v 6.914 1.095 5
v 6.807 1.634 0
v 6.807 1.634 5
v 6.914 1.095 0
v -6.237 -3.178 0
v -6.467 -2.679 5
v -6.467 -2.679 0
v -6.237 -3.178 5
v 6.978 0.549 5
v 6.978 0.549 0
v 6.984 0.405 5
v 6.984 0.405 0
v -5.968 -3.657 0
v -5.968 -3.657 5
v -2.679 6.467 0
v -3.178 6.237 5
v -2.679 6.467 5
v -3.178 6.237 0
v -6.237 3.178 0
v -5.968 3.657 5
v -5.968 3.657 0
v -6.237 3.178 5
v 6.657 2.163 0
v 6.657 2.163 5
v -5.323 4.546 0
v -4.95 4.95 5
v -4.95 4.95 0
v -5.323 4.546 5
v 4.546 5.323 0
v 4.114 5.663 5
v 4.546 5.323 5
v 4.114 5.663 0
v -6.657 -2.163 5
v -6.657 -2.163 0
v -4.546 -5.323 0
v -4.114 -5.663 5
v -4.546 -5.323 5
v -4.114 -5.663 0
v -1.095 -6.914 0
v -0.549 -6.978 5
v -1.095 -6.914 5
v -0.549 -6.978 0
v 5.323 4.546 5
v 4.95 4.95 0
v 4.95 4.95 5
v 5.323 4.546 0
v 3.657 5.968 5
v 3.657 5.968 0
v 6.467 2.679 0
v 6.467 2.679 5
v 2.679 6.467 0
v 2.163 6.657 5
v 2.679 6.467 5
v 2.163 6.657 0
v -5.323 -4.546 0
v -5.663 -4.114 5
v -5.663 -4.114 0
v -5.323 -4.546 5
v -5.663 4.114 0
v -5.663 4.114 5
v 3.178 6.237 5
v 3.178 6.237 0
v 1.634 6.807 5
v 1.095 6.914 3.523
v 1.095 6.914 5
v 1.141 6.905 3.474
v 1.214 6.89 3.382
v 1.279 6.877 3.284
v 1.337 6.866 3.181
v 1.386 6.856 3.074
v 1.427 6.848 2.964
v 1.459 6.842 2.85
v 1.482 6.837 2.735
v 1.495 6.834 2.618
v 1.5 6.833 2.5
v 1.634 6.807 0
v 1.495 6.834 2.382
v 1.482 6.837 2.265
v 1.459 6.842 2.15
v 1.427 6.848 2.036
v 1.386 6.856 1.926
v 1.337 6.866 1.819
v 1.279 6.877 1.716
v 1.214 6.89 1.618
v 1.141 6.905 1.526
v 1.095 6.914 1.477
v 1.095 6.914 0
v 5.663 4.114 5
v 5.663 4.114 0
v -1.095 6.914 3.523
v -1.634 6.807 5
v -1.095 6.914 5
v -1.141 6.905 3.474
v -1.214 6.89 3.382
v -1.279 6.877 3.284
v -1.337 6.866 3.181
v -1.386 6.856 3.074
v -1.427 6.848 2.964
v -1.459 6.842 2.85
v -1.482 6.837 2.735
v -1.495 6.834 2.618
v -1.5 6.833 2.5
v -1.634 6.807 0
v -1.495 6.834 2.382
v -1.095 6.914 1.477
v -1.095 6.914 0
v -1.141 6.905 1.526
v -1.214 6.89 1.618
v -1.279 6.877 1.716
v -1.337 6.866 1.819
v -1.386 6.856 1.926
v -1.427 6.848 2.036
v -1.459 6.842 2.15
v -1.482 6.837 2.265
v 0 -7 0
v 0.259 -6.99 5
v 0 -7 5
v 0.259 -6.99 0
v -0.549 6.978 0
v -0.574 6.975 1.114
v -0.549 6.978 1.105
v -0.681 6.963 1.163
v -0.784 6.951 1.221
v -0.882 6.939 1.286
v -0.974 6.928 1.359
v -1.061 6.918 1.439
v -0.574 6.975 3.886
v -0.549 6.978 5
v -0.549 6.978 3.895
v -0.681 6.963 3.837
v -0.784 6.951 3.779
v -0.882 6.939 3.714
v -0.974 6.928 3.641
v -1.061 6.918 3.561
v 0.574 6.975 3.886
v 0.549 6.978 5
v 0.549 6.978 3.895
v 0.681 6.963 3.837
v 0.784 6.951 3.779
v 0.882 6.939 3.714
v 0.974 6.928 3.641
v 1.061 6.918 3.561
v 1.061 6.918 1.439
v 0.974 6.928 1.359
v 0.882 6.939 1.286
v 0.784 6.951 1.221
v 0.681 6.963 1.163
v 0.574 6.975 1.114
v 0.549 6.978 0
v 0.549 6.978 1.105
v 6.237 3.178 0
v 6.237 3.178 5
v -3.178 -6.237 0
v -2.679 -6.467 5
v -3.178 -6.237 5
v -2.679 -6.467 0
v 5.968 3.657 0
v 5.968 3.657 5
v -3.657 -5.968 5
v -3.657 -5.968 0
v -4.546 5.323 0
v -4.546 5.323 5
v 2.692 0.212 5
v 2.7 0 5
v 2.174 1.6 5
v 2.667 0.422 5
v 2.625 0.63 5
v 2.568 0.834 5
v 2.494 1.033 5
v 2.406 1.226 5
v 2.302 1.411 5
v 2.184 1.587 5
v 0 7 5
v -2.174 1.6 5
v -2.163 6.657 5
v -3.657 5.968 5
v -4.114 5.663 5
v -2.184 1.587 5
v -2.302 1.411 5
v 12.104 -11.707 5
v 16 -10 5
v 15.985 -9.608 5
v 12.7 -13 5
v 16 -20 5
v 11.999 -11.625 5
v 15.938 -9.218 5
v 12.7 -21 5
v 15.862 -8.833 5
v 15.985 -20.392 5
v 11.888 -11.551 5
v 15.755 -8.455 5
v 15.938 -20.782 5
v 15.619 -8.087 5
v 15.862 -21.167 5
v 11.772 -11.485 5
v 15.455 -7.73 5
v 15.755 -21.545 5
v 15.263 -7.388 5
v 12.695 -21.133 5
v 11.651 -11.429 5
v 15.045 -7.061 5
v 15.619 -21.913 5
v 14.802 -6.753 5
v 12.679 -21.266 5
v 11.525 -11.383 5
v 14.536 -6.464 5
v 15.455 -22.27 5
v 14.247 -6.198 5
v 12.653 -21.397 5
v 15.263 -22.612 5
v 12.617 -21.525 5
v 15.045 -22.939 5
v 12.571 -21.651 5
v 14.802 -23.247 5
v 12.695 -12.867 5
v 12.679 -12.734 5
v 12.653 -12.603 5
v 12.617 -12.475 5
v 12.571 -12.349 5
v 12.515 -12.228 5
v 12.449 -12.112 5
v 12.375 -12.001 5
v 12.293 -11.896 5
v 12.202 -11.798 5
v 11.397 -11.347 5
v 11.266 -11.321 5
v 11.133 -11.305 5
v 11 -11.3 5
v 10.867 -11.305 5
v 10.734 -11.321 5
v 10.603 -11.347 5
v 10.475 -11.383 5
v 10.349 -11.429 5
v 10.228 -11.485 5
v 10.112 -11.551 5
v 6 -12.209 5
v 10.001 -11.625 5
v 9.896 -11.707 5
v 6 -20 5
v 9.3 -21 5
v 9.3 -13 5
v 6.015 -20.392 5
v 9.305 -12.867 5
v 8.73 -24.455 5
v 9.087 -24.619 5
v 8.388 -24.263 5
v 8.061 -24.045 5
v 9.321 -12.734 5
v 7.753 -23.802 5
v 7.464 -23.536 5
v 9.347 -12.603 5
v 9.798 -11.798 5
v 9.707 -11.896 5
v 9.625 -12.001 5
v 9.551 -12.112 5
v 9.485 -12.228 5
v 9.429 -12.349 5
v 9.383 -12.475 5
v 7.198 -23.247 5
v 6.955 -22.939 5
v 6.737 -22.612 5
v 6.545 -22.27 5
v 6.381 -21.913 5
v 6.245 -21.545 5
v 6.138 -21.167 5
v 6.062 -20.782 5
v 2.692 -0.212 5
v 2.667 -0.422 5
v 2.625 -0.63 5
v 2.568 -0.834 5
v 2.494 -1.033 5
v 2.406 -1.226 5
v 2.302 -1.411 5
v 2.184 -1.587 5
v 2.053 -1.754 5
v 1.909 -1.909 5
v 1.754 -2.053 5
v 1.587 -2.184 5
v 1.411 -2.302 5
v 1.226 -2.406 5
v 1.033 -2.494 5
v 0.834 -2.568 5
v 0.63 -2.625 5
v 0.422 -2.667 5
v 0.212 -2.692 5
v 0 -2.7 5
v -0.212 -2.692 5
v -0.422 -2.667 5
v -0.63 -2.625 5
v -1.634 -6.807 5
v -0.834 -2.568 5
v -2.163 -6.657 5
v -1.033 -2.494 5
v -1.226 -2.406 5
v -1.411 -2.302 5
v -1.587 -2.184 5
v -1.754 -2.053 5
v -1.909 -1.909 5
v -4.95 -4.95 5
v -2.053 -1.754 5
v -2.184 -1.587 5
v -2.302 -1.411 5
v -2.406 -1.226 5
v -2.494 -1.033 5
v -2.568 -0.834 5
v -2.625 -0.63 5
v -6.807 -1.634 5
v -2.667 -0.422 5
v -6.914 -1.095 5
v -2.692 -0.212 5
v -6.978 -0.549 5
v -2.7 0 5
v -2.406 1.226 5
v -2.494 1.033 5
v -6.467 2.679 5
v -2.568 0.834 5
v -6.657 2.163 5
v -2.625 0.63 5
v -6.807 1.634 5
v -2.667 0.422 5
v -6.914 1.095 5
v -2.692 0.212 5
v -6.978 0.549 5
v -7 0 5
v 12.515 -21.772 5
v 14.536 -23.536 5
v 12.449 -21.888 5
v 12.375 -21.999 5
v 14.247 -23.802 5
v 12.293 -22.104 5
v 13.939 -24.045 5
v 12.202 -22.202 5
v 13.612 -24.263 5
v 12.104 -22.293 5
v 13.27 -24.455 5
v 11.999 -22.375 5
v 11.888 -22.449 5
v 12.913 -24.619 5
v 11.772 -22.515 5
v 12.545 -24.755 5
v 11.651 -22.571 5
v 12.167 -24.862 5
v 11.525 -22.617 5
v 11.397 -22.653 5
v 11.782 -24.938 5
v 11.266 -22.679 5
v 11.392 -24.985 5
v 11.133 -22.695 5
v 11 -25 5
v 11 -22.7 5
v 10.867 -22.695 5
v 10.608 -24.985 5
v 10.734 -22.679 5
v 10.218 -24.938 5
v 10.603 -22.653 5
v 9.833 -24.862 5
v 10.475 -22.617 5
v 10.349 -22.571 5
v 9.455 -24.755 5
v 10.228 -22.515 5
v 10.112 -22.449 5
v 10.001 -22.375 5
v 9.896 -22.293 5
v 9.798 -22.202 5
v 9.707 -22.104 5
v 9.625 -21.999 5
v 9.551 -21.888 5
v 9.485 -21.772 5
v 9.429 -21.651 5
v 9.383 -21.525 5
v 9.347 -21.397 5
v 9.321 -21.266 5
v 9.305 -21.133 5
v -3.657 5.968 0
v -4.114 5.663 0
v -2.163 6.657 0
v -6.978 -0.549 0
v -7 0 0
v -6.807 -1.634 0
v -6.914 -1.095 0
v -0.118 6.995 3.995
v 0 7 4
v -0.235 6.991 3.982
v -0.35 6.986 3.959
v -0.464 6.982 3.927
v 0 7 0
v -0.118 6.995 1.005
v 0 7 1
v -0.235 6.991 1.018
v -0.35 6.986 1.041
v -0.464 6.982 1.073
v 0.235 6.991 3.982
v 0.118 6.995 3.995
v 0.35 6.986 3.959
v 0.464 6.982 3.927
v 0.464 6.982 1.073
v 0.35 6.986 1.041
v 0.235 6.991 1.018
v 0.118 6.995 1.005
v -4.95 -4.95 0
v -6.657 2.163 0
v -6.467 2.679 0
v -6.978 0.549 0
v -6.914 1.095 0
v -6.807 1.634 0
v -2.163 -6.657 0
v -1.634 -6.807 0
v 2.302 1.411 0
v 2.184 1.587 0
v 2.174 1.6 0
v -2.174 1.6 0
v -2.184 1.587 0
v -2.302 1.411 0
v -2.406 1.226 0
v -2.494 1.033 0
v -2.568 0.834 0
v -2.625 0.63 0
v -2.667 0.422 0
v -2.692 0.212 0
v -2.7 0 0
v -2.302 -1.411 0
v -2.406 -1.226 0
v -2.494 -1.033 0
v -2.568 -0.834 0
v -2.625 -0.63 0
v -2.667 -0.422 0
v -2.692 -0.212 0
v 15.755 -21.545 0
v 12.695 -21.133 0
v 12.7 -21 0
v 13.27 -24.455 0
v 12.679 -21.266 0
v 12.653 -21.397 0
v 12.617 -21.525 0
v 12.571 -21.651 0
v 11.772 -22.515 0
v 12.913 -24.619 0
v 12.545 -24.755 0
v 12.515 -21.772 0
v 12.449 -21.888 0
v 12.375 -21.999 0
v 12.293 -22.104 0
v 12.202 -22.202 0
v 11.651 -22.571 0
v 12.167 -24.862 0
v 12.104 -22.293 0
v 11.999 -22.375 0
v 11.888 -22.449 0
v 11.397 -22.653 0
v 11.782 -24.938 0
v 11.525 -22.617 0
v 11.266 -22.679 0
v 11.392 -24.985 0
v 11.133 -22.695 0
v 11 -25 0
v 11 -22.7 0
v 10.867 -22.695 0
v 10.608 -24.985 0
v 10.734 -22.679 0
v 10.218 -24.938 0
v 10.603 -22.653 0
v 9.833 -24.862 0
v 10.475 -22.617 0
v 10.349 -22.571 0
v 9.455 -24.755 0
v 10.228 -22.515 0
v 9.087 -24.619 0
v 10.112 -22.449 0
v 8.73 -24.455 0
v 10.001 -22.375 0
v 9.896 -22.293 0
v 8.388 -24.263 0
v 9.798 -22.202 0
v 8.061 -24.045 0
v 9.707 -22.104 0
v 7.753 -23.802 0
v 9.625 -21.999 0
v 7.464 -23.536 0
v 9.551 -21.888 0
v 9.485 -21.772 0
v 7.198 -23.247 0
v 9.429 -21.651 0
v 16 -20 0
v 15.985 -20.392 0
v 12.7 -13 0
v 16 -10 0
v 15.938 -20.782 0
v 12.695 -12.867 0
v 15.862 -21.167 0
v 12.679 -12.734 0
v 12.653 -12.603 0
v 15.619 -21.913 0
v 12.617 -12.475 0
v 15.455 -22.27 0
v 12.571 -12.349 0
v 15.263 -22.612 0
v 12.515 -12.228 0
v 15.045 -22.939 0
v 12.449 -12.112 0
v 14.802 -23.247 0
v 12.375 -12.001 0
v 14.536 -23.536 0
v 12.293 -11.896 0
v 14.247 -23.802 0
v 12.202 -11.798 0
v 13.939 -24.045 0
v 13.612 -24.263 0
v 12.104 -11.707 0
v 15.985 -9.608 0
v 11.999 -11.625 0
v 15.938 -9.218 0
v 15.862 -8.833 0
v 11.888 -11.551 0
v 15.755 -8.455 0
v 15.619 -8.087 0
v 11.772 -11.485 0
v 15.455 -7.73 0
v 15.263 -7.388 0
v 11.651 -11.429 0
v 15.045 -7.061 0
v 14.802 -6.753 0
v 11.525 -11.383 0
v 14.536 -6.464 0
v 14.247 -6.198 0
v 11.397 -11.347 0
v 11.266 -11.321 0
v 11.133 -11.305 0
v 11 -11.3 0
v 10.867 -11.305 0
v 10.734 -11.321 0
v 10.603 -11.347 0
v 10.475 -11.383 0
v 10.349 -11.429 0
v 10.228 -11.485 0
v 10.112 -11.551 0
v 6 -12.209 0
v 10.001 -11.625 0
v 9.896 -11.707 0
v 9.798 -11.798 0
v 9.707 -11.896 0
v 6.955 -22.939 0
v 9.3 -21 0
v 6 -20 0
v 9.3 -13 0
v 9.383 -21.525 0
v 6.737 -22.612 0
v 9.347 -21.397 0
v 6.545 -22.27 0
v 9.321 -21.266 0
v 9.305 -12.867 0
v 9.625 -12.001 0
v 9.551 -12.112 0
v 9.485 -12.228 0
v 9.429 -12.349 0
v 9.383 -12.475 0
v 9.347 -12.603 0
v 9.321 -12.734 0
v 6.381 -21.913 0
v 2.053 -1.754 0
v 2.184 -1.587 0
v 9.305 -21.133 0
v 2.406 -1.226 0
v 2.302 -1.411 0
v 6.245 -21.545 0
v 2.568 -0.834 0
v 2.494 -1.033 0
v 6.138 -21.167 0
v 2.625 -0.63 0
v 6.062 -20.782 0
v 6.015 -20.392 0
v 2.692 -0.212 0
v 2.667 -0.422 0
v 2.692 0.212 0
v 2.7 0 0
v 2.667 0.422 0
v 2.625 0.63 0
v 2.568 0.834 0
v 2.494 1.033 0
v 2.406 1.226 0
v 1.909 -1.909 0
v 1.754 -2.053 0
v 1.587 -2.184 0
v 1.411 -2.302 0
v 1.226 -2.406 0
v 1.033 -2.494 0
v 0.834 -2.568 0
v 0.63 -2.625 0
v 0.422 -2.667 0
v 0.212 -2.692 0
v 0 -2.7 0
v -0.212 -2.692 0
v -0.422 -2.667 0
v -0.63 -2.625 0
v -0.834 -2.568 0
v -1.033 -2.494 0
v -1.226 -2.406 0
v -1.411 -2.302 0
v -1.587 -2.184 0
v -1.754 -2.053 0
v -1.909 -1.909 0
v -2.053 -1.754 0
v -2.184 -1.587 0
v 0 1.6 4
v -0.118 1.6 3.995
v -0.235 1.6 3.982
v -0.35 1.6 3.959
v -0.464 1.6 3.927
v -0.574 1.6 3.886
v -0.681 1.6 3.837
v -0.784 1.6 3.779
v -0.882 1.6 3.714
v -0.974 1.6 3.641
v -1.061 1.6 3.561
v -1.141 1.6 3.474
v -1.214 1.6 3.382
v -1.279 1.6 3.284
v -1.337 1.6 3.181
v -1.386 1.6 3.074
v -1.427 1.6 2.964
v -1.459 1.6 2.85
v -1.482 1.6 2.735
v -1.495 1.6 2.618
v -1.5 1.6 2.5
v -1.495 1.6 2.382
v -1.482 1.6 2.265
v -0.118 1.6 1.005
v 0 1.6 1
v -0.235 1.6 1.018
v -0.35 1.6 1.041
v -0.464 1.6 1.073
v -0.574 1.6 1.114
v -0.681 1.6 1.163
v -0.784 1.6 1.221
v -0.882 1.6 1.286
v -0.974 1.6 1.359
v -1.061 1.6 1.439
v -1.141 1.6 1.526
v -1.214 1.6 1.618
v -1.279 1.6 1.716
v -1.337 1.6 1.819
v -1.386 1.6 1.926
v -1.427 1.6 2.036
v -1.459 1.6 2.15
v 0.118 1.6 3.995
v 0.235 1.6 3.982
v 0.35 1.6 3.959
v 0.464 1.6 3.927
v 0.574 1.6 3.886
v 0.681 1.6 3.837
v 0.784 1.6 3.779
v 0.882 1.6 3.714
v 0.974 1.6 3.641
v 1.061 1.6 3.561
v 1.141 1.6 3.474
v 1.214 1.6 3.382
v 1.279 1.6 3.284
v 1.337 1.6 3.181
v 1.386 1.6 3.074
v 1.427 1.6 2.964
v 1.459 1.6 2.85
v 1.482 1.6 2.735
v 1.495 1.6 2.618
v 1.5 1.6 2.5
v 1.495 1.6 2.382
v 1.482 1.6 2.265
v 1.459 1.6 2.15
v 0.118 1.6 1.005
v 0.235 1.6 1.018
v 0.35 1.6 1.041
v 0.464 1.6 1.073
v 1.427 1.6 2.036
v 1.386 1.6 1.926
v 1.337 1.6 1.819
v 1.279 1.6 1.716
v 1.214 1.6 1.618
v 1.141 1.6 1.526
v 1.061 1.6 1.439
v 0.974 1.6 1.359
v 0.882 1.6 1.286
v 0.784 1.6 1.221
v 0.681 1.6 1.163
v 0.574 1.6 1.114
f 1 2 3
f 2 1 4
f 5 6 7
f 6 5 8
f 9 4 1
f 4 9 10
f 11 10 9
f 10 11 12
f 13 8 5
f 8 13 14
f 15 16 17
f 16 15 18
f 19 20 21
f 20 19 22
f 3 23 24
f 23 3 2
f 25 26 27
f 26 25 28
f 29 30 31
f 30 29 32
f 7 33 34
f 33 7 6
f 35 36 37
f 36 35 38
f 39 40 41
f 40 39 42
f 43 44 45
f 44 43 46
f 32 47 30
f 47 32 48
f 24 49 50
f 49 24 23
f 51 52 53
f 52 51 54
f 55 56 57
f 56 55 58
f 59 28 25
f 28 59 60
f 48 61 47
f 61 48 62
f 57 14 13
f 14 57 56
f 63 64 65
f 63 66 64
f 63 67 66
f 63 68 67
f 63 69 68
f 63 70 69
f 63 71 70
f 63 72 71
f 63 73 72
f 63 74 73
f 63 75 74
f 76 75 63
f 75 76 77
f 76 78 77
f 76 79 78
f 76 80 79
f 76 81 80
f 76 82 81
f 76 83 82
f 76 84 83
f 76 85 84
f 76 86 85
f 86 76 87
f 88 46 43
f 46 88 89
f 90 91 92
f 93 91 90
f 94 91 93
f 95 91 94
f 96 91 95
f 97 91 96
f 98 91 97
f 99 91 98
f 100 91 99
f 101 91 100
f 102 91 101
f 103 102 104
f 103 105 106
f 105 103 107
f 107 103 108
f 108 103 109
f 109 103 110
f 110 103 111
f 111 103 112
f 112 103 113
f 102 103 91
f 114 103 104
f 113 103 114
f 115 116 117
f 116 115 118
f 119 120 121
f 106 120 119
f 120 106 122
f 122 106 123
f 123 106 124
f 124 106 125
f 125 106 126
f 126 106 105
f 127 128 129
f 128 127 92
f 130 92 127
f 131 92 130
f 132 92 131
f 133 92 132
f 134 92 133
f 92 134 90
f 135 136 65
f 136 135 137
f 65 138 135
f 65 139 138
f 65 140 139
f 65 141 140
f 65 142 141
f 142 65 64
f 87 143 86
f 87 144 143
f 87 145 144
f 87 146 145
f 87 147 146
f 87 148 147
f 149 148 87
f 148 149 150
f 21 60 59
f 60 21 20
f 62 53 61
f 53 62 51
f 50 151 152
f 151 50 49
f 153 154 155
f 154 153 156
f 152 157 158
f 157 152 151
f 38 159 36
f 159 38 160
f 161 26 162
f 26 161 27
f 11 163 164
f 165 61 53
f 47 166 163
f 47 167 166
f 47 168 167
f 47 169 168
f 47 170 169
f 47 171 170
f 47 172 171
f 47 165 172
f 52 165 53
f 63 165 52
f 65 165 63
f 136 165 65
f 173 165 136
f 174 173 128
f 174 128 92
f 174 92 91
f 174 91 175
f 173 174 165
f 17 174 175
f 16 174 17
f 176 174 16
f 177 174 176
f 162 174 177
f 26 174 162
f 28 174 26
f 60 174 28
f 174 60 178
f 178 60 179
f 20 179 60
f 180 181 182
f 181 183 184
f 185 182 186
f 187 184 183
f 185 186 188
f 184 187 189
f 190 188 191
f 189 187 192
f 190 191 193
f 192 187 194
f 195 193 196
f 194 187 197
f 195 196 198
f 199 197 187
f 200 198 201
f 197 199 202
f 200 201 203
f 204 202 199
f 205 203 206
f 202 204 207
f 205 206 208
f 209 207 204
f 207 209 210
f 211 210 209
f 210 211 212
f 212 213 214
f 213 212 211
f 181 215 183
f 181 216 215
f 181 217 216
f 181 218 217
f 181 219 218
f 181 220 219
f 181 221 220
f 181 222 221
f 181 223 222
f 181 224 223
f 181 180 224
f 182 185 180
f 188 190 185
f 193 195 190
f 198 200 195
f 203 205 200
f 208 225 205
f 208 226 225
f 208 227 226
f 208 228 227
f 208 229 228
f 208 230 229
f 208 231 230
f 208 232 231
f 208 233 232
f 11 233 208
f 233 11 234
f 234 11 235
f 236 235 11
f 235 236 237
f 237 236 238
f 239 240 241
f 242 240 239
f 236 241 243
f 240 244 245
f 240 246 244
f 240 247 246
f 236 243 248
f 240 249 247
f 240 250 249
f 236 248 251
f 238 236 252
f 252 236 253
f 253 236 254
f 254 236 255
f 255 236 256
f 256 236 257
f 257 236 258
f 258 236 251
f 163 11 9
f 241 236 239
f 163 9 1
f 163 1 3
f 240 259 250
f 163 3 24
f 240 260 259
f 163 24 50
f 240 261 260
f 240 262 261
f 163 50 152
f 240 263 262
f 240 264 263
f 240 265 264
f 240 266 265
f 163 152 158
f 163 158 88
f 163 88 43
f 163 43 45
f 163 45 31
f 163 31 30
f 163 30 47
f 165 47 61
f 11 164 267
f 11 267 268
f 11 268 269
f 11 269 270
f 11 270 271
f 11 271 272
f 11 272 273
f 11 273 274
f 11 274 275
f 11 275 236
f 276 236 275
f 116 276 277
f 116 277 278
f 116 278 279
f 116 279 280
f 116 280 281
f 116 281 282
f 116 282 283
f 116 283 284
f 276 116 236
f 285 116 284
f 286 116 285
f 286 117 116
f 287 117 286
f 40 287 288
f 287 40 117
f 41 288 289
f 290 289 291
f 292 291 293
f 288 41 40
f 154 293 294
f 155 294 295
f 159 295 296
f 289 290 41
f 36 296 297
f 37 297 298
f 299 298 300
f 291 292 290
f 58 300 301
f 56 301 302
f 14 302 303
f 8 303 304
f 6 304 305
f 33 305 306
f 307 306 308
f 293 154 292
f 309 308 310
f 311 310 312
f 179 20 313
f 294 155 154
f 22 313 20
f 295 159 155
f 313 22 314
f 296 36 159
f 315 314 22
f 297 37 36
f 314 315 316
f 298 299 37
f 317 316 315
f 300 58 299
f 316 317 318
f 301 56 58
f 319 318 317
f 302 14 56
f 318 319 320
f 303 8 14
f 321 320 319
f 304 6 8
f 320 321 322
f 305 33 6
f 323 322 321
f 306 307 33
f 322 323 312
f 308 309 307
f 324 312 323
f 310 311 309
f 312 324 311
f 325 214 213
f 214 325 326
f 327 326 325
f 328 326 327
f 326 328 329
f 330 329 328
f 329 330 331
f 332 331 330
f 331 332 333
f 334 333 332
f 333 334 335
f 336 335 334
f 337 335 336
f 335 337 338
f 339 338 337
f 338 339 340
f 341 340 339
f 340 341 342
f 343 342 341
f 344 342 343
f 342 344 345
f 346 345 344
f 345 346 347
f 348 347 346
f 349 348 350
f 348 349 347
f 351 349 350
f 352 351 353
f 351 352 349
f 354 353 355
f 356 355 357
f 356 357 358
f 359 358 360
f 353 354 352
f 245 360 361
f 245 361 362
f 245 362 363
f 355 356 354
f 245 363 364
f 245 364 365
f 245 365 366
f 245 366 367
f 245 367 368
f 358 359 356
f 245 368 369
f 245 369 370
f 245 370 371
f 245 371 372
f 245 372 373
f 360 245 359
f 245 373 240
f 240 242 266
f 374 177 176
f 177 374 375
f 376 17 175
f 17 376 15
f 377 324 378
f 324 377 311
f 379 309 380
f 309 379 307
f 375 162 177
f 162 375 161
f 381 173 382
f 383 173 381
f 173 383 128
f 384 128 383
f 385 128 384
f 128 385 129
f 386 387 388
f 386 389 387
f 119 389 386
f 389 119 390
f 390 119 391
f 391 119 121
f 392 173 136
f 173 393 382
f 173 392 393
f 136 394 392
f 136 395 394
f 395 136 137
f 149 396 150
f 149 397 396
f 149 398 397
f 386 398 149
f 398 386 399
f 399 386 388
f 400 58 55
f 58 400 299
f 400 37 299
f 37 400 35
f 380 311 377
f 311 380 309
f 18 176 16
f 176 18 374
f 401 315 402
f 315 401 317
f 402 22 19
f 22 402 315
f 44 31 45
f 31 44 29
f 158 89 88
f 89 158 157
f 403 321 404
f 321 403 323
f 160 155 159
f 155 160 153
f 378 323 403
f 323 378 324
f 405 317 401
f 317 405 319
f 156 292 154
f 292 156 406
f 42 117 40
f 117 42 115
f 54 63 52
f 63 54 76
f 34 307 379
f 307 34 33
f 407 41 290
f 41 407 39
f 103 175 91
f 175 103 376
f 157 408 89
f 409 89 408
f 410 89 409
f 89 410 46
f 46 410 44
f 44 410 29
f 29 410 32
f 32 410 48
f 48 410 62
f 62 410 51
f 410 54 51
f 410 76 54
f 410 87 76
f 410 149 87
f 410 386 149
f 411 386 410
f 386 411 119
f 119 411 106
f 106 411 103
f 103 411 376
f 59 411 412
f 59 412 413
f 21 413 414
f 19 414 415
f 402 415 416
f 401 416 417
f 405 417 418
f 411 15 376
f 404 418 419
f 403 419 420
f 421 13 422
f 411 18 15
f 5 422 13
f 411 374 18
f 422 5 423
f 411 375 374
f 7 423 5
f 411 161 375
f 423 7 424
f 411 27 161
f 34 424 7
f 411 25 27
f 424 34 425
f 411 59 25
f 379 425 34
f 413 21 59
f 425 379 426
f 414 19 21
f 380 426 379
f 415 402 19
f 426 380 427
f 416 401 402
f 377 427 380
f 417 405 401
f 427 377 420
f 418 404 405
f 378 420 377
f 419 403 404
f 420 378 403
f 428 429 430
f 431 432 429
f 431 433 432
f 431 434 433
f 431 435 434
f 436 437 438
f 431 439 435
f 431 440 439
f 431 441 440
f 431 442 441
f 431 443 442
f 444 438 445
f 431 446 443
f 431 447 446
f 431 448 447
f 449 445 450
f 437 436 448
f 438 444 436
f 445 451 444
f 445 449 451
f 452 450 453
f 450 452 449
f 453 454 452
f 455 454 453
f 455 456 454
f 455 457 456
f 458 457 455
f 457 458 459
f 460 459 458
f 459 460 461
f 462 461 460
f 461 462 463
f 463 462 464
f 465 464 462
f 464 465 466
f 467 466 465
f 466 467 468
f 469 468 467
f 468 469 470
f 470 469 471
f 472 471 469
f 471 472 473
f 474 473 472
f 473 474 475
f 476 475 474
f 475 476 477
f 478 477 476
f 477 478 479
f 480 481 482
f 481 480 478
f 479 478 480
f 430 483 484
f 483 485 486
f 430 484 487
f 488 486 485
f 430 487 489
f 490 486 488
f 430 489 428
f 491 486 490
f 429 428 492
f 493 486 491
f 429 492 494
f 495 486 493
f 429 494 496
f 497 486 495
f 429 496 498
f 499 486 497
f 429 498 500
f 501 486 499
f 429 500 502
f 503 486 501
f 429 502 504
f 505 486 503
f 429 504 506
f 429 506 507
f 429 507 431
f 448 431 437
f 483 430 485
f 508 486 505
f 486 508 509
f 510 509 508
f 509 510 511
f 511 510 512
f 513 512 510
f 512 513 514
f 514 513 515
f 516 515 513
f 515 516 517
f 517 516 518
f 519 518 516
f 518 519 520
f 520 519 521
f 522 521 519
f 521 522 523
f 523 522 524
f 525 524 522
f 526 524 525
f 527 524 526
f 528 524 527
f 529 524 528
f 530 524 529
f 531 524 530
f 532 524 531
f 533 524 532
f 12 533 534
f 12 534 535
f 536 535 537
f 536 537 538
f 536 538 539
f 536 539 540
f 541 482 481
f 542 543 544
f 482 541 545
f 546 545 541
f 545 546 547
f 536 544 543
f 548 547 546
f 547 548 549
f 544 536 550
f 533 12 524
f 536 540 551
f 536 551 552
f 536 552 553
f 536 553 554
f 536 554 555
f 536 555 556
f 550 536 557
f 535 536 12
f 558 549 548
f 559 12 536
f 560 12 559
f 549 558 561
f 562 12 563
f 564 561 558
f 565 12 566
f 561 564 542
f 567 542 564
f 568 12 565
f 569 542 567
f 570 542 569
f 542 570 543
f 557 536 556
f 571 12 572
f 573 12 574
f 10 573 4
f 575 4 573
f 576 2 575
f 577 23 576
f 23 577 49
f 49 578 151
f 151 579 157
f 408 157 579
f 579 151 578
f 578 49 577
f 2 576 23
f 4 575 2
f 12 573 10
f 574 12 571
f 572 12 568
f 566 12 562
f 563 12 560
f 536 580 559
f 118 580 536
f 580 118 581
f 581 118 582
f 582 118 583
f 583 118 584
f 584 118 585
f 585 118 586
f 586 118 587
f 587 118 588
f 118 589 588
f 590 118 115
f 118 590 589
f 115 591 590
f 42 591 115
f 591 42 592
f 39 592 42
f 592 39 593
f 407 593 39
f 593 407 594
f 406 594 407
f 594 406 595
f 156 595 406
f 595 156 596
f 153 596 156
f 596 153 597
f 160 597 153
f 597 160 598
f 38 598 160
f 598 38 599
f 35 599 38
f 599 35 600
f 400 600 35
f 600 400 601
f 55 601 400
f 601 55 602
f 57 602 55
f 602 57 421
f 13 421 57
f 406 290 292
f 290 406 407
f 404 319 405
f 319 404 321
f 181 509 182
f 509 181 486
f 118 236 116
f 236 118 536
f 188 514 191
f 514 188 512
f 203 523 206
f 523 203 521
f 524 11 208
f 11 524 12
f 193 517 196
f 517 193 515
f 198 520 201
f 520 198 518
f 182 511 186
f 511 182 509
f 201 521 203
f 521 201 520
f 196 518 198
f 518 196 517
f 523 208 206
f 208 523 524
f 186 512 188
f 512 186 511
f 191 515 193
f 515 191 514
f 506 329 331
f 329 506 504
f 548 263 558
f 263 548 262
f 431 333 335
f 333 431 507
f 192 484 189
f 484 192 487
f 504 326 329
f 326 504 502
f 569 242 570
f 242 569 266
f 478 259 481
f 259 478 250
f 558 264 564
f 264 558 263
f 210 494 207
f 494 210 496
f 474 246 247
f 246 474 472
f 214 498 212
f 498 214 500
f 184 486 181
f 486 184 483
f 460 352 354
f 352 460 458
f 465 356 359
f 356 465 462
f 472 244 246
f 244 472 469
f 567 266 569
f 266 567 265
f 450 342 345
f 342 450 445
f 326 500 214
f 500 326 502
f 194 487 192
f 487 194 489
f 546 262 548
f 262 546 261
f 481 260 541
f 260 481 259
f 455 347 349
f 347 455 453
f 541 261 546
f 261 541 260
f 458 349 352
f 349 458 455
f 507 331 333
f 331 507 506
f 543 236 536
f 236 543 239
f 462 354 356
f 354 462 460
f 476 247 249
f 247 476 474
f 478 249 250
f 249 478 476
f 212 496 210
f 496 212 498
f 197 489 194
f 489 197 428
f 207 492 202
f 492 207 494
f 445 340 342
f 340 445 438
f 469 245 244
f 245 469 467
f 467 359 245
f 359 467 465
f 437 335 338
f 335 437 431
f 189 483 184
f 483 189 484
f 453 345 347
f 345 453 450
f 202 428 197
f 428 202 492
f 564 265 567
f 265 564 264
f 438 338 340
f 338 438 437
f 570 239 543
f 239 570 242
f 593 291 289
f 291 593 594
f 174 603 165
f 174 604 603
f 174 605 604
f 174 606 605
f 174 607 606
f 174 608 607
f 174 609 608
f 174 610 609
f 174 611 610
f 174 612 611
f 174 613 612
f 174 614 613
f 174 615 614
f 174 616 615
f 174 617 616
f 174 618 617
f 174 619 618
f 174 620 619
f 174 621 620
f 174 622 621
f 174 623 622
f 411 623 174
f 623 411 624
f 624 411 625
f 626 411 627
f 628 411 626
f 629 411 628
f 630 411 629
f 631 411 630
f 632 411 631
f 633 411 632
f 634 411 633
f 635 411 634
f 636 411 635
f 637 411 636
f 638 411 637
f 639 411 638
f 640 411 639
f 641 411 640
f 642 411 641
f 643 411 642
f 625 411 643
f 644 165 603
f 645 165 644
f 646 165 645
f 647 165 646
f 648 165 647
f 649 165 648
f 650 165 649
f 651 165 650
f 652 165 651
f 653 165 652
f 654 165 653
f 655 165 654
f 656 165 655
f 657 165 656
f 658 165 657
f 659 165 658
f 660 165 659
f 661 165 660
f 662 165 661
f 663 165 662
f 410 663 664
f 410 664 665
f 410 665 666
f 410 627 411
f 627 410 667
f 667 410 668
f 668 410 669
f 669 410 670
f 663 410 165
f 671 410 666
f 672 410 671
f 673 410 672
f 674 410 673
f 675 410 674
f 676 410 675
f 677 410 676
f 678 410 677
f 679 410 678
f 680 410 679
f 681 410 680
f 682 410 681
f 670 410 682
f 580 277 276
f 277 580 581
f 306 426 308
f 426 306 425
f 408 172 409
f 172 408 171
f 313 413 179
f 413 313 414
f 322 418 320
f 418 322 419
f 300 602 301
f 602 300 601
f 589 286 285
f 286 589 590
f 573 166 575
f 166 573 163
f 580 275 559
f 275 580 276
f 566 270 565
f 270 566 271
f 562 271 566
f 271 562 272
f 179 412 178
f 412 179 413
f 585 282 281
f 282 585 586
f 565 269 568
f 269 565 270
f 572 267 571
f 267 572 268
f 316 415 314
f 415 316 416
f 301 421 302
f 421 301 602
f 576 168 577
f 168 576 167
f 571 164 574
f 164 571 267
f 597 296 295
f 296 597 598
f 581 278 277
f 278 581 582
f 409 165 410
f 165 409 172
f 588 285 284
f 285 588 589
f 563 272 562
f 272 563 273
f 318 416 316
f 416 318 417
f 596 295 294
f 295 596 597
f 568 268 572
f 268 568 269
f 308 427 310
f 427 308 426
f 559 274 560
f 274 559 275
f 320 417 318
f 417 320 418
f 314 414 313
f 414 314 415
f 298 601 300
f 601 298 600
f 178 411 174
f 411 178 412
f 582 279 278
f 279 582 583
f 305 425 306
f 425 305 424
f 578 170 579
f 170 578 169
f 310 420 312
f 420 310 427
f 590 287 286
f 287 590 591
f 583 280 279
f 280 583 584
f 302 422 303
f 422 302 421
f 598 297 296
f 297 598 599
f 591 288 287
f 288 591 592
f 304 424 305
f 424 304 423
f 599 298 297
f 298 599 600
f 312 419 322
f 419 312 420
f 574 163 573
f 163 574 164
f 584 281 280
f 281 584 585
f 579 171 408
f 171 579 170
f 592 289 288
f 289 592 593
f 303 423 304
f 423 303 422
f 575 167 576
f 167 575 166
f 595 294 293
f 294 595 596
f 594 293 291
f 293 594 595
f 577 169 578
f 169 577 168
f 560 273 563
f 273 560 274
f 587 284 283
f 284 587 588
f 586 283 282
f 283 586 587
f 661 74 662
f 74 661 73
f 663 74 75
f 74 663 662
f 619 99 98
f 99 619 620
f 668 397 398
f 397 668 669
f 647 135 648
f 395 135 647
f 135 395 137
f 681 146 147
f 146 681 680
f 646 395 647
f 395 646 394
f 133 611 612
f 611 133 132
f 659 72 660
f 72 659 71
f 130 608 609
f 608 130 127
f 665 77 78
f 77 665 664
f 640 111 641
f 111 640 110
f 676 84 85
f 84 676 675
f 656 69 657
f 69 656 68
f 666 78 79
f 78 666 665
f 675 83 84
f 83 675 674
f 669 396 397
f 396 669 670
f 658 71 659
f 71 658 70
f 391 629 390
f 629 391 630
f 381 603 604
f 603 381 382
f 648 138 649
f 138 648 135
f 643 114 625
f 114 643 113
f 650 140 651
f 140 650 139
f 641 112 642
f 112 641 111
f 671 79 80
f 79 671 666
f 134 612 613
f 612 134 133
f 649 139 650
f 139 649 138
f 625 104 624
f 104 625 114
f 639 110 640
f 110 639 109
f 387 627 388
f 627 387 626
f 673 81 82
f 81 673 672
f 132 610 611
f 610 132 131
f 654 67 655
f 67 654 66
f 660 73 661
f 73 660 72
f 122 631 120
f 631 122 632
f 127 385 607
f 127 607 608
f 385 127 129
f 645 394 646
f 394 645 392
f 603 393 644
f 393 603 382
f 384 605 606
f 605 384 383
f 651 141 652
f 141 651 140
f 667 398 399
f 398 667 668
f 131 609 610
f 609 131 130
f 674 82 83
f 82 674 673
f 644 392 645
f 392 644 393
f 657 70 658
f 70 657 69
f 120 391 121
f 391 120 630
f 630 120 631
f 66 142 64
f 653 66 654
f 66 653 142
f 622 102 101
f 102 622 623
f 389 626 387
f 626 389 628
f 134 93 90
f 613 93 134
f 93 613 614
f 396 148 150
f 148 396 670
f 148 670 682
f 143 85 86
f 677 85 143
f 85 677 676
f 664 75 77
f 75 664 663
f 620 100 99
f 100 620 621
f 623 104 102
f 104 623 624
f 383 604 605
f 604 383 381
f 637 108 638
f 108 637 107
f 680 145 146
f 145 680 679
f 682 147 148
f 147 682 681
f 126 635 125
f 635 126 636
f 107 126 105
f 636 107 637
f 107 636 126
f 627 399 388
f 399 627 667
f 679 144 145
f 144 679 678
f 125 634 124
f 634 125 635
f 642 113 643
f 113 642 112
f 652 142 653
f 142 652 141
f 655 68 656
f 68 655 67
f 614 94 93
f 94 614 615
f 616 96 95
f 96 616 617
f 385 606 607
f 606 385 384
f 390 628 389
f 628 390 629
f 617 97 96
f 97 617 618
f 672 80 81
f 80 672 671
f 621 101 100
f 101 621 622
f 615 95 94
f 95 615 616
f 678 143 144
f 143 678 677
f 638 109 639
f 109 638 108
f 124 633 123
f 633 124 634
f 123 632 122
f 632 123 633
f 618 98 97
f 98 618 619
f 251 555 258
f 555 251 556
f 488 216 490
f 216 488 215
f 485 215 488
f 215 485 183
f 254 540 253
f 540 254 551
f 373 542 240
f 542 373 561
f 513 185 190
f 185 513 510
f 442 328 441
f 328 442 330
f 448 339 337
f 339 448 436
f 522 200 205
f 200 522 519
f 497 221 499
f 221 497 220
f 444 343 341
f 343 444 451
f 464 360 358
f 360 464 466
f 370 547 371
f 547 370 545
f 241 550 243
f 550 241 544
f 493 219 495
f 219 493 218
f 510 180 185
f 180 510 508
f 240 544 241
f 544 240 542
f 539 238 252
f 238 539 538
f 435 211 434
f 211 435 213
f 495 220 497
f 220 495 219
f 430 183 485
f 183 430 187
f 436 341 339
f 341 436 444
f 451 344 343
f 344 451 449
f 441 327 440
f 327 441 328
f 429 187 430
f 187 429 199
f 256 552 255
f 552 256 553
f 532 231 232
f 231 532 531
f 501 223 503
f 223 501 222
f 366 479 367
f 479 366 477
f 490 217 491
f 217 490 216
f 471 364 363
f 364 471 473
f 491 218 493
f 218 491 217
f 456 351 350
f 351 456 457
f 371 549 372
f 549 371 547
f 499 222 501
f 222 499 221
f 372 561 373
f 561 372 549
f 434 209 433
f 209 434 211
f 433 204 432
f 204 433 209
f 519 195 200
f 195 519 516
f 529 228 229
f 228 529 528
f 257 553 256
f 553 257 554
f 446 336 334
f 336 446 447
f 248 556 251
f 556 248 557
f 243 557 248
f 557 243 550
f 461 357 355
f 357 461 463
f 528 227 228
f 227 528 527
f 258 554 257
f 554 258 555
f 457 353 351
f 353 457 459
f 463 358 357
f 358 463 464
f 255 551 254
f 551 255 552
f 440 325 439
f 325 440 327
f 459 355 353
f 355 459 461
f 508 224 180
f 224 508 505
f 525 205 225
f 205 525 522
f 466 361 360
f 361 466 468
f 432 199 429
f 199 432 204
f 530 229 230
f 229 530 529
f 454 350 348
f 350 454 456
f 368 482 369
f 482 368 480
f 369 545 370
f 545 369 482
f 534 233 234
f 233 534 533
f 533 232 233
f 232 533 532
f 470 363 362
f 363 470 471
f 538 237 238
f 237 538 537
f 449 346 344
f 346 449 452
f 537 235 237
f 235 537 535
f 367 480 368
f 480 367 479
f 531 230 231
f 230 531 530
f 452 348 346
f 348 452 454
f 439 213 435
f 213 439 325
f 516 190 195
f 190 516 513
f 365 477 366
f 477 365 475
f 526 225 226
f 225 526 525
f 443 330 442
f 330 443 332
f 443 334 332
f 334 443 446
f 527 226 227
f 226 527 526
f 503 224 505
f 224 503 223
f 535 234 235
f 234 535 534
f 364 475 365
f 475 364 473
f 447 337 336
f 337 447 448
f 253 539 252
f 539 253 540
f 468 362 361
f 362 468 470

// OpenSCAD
/*
 * L-Shaped Slotted Linkage Arm
 * RedCat 51 Flat Panel — separate printed arm that pivots on the
 * 28BYJ-48 D-shaft and bolts to the main_body bracket.
 *
 * Print flat (arm lies in XY plane, thickness in Z = shaft axis direction).
 * Mount on D-shaft at hub; tighten M3 set screw through +Y face.
 * Bolt vertical segment to main_body bracket through slot.
 *
 * Fully parametric · Units: mm
 */

///////////////////////
// PARAMETERS
///////////////////////

// Arm face thickness (= shaft axis direction when mounted)
thickness           =  5;

// Pivot hub
pivot_diameter      = 14;    // matches arm_hub_d in flat_panel_v2.scad
pivot_hole_diameter =  5.4;  // D-shaft clearance (shaft_d 5.0 + 0.4)

// D-shaft geometry (for D-flat cutout in hub)
shaft_d    = 5.0;
shaft_flat = 1.6;   // distance from shaft centre to flat face

// Horizontal arm (hub → elbow); diagonal in XY plane
horizontal_length   = 11;   // X offset to elbow  (≈ shaft_cx − x_break = 66.1 − 55)
arm_width           = 10;   // bar diameter

// Vertical arm (elbow → arm tip carrying bolt slot)
vertical_length     = 10;   // length of vertical segment
vertical_offset     = 10;   // Y offset at elbow (was hardcoded −10)

// Slot in vertical arm (M3 bolt to main_body bracket, Y-adjustable)
slot_length         =  8;   // adjustment range
slot_width          =  3.4; // M3 clearance diameter
slot_margin_bottom  =  3;   // gap from elbow to slot start

// Fillet resolution
$fn = 80;

///////////////////////
// HELPER MODULES
///////////////////////

module rounded_bar(p1, p2, width) {
    hull() {
        translate(p1) cylinder(h = thickness, d = width);
        translate(p2) cylinder(h = thickness, d = width);
    }
}

// Slot: hull of two cylinders, through full thickness + overcut
module slot_cut(p1, p2, width) {
    hull() {
        translate(p1) cylinder(h = thickness + 1, d = width);
        translate(p2) cylinder(h = thickness + 1, d = width);
    }
}

///////////////////////
// MAIN MODULE
///////////////////////

module linkage_arm_L() {
    difference() {

        union() {
            // Pivot hub disc
            cylinder(h = thickness, d = pivot_diameter);

            // Horizontal (diagonal) arm: hub → elbow
            rounded_bar([0, 0], [horizontal_length, -vertical_offset], arm_width);

            // Vertical arm: elbow → arm tip
            rounded_bar(
                [horizontal_length, -vertical_offset],
                [horizontal_length, -vertical_offset - vertical_length],
                arm_width
            );
        }

        // ── D-shaft hole through hub — axis along +Z (arm thickness direction)
        //    D-flat faces +Y so set screw can clamp from the +Y face.
        translate([0, 0, -0.5])
            linear_extrude(thickness + 1)
                difference() {
                    circle(d = pivot_hole_diameter);
                    // Remove the flat: cut material at +Y side of shaft circle
                    translate([0, shaft_flat + shaft_d / 2])
                        square([shaft_d + 1, shaft_d], center = true);
                }

        // ── M3 set screw — enters from +Y face of hub, points toward shaft axis
        translate([0, pivot_diameter / 2 + 1, thickness / 2])
            rotate([90, 0, 0])
                cylinder(d = 3.0, h = pivot_diameter / 2 + 2);

        // ── Adjustable slot in vertical arm (M3 bolt to main_body bracket)
        slot_cut(
            [horizontal_length, -vertical_offset - slot_margin_bottom],
            [horizontal_length, -vertical_offset - slot_margin_bottom - slot_length],
            slot_width
        );
    }
}

///////////////////////
// RENDER
///////////////////////

linkage_arm_L();
